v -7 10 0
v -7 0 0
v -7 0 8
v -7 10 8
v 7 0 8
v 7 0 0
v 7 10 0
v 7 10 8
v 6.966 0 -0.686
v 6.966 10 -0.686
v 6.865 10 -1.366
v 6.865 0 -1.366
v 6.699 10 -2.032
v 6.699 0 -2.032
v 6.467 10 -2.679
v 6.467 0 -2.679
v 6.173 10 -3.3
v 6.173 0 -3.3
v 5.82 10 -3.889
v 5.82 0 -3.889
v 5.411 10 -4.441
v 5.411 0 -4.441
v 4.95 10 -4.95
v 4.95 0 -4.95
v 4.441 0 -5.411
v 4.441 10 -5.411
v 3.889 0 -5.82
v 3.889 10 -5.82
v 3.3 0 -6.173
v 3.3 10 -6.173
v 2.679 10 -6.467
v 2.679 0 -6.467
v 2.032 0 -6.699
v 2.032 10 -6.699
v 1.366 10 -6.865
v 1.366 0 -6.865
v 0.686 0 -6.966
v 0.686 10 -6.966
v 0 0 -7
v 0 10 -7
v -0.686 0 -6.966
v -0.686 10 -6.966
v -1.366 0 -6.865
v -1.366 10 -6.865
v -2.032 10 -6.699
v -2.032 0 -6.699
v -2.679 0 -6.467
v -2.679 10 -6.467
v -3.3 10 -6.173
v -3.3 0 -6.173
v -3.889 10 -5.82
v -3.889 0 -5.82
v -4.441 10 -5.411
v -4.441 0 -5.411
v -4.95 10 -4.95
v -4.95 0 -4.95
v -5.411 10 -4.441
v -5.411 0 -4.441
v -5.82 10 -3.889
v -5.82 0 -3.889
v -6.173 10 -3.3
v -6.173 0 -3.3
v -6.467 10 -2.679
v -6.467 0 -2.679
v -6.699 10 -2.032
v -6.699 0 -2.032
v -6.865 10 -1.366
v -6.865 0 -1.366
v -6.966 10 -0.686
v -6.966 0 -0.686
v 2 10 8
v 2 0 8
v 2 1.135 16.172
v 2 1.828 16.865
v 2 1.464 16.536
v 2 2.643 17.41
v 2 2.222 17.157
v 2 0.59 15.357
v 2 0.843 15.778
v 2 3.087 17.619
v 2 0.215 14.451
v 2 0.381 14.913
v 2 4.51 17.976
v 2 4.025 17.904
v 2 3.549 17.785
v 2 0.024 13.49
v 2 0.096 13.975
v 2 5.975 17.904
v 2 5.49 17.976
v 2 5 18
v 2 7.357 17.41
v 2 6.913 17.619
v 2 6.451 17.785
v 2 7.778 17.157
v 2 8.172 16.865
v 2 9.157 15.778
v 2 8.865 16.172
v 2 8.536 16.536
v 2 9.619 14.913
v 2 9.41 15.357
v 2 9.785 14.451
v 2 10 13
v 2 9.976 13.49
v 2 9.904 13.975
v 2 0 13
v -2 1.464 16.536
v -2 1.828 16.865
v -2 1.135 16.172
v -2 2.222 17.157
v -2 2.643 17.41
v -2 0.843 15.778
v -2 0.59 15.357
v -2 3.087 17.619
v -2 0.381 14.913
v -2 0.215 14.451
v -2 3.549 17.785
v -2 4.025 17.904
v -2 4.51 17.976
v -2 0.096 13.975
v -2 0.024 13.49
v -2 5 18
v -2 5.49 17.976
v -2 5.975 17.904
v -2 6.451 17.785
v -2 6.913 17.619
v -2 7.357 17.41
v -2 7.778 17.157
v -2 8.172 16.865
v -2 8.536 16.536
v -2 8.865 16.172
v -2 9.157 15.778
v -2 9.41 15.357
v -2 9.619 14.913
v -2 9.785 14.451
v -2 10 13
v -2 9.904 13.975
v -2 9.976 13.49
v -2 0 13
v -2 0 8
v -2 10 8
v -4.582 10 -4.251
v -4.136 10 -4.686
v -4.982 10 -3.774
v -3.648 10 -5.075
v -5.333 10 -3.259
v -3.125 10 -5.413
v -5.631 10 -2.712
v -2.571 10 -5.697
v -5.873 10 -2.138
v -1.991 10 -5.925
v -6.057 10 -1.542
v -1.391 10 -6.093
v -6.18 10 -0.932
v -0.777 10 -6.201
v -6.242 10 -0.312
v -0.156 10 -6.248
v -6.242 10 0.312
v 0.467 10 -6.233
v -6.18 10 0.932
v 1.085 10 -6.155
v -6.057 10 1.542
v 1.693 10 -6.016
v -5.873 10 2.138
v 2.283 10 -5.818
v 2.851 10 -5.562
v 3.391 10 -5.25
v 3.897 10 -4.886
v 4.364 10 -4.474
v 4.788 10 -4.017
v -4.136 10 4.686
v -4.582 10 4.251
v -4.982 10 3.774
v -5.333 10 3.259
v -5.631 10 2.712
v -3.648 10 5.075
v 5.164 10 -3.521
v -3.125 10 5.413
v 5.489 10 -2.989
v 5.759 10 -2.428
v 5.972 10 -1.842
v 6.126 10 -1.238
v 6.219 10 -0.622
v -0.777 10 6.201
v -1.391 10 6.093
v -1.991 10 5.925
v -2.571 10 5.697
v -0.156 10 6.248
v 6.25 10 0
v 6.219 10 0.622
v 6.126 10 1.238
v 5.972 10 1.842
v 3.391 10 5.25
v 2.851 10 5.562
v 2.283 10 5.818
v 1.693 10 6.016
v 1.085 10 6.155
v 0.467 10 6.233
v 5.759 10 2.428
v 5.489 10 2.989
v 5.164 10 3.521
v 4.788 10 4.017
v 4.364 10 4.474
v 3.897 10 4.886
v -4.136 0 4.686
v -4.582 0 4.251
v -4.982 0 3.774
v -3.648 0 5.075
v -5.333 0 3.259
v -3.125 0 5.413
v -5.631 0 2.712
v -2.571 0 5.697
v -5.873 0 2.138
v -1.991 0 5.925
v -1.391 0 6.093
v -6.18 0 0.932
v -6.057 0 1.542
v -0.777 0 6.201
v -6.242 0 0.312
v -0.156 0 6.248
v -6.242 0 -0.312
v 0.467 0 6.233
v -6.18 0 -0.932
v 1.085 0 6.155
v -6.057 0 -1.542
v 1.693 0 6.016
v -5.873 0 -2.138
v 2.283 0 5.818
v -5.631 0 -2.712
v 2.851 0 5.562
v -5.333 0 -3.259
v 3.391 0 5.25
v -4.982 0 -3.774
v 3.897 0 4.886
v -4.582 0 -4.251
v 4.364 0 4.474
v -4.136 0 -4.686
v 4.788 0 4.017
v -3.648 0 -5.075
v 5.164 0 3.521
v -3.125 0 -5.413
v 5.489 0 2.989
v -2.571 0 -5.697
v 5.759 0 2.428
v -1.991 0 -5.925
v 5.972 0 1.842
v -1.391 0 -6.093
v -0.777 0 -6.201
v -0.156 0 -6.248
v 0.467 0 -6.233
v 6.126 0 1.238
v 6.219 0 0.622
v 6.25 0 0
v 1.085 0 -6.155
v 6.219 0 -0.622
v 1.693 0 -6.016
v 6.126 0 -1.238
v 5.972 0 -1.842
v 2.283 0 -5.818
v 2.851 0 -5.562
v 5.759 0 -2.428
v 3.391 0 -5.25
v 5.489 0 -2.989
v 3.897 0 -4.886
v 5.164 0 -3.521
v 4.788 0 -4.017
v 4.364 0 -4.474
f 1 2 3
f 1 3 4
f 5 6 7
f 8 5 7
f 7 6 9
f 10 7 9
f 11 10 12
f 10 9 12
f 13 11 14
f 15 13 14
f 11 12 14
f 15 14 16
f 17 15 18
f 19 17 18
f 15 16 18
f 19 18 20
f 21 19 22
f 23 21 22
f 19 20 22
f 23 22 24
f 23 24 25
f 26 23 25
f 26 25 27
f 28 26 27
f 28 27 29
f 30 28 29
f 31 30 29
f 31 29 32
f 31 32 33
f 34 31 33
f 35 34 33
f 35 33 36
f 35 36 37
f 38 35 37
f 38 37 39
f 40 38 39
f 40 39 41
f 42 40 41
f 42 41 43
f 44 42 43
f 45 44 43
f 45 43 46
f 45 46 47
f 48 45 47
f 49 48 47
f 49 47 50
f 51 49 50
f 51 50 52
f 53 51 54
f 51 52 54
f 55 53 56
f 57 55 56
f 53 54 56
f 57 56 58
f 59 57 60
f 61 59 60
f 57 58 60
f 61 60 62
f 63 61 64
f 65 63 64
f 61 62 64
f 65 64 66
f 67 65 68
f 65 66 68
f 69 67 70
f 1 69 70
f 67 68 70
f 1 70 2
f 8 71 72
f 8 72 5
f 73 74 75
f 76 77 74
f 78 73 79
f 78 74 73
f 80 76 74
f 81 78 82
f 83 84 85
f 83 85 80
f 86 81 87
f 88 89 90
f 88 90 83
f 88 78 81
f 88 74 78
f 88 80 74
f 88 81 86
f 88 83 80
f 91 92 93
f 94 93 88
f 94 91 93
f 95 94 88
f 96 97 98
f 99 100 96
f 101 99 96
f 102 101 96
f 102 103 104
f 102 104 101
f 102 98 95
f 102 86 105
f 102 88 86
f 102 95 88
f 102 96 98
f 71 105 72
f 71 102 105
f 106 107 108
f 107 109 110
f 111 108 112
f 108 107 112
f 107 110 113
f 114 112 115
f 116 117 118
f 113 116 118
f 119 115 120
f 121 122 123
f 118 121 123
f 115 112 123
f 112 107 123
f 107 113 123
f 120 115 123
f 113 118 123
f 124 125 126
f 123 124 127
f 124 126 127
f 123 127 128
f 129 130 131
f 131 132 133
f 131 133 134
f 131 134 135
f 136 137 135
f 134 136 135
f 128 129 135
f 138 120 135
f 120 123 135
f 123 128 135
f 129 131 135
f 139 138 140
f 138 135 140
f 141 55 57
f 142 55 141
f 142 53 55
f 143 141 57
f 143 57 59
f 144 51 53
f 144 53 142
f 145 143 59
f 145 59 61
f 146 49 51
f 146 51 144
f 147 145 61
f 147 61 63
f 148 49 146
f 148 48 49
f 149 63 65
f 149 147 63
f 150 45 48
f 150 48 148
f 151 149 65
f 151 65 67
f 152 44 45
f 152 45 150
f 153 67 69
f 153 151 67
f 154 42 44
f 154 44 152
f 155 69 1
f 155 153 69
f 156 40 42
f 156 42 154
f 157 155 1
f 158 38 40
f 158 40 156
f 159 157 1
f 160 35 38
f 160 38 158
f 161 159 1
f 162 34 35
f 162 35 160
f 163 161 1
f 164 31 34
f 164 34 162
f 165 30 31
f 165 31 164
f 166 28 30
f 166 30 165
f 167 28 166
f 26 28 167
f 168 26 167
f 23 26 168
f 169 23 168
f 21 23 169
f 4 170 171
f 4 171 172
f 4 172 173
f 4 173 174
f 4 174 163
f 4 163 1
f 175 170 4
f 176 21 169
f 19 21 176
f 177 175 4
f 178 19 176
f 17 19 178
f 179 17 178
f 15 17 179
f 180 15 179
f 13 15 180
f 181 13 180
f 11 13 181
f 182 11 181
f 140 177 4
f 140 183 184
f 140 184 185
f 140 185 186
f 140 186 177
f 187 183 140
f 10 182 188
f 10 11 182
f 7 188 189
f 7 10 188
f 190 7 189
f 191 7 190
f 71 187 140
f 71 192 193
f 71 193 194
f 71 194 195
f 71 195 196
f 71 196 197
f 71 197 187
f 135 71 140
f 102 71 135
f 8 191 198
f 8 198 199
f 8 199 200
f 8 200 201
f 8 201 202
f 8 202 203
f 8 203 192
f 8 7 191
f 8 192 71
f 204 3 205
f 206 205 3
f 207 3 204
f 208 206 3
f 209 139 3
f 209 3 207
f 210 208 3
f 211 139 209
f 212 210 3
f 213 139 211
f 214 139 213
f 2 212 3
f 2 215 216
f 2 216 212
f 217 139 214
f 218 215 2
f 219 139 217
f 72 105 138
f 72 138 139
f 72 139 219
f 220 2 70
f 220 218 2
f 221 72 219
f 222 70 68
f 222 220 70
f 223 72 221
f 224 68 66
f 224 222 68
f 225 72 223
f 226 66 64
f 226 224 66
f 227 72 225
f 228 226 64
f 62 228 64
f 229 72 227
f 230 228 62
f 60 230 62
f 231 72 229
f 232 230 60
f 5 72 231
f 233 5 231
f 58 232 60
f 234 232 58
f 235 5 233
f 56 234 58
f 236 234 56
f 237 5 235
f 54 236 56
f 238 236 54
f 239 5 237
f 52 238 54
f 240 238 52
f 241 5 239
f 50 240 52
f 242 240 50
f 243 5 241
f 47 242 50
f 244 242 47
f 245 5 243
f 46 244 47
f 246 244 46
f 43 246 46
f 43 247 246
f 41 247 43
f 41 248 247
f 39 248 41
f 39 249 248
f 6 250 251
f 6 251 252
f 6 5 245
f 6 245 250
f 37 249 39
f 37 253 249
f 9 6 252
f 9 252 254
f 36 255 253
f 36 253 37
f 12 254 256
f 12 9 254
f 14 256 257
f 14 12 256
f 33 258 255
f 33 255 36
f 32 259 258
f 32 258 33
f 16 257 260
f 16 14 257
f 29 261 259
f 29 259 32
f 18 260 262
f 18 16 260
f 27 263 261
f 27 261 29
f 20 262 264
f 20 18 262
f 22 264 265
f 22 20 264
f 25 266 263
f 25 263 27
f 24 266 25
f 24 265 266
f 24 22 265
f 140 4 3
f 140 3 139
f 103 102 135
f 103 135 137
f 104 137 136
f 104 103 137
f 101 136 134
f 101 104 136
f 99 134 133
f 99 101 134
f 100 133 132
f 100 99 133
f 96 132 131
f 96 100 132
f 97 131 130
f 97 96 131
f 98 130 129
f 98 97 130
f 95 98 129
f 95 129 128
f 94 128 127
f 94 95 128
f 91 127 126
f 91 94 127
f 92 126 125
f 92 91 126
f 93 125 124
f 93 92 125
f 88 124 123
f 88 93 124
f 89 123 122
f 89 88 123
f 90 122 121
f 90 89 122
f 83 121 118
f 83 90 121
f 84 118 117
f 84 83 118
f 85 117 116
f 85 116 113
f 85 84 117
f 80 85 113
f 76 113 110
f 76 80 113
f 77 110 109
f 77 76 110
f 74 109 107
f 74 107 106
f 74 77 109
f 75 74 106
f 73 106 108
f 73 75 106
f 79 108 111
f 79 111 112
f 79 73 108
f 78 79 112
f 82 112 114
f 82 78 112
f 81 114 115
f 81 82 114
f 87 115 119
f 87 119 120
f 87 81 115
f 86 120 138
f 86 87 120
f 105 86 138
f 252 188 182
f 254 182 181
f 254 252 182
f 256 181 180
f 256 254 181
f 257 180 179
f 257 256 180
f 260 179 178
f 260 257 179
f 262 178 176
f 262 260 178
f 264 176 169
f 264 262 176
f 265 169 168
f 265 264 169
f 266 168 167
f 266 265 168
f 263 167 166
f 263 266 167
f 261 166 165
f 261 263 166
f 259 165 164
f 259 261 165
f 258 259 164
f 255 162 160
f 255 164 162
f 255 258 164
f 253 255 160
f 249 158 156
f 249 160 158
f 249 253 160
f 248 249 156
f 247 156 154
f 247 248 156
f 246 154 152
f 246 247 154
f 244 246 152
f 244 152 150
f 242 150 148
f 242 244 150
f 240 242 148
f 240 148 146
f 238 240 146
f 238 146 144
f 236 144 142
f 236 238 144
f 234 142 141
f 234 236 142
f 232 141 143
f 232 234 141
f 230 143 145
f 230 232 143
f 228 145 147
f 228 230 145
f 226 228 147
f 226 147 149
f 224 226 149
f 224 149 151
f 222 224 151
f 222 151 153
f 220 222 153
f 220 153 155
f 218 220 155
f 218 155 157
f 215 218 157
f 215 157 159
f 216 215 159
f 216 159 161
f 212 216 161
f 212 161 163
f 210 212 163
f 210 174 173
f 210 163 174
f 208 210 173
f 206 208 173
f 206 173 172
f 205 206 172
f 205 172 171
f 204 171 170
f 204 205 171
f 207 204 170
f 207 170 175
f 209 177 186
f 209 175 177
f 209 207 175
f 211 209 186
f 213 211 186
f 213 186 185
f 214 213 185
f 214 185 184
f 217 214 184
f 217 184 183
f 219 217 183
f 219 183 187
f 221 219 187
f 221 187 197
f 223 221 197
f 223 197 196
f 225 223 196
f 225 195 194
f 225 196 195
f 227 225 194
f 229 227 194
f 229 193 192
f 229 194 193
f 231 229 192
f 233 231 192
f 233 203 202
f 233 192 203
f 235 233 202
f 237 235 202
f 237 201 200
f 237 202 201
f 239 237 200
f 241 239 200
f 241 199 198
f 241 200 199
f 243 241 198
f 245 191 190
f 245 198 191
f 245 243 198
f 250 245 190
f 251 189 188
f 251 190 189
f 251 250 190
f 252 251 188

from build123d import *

# Parameters (mm, degrees)
SKETCH1_R                = 7
SKETCH1_R_2              = 6.25
BOSS_EXTRUDE1_DEPTH      = 10
SKETCH3_W                = 14
SKETCH3_H                = 10
BOSS_EXTRUDE2_DEPTH      = 8
SKETCH4_R                = 6.25
CUT_EXTRUDE1_DEPTH       = 20
BOSS_EXTRUDE3_DEPTH      = 2
BOSS_EXTRUDE3_DEPTH_BACK = 2


with BuildPart() as part:
    # Sketch1 → Boss-Extrude1 (new body)
    with BuildSketch(Plane(origin=(0, 0, 0), x_dir=(1, 0, 0), z_dir=(0, 1, 0))):
        Circle(SKETCH1_R)
        Circle(SKETCH1_R_2, mode=Mode.SUBTRACT)
    extrude(amount=BOSS_EXTRUDE1_DEPTH)

    # Sketch3 → Boss-Extrude2 (add)
    with BuildSketch(Plane.XY):
        with Locations((0, 5)):
            Rectangle(SKETCH3_W, SKETCH3_H)
    extrude(amount=BOSS_EXTRUDE2_DEPTH)

    # Sketch4 → Cut-Extrude1 (cut)
    with BuildSketch(Plane(origin=(0, 10, 0), x_dir=(1, 0, 0), z_dir=(0, 1, 0))):
        Circle(SKETCH4_R)
    extrude(amount=-CUT_EXTRUDE1_DEPTH, mode=Mode.SUBTRACT)

    # Sketch6 → Boss-Extrude3 (add, two sides)
    with BuildSketch(Plane(origin=(0, 0, 0), x_dir=(0, 0, -1), z_dir=(1, 0, 0))) as boss_extrude3_sk:
        with BuildLine():
            Line((-8, 10), (-13, 10))
            ThreePointArc((-13, 10), (-18, 5), (-13, 0))
            Line((-13, 0), (-8, 0))
            Line((-8, 0), (-8, 10))
        make_face()
    extrude(amount=BOSS_EXTRUDE3_DEPTH)
    extrude(boss_extrude3_sk.sketch, amount=-BOSS_EXTRUDE3_DEPTH_BACK)


solid = part.part
